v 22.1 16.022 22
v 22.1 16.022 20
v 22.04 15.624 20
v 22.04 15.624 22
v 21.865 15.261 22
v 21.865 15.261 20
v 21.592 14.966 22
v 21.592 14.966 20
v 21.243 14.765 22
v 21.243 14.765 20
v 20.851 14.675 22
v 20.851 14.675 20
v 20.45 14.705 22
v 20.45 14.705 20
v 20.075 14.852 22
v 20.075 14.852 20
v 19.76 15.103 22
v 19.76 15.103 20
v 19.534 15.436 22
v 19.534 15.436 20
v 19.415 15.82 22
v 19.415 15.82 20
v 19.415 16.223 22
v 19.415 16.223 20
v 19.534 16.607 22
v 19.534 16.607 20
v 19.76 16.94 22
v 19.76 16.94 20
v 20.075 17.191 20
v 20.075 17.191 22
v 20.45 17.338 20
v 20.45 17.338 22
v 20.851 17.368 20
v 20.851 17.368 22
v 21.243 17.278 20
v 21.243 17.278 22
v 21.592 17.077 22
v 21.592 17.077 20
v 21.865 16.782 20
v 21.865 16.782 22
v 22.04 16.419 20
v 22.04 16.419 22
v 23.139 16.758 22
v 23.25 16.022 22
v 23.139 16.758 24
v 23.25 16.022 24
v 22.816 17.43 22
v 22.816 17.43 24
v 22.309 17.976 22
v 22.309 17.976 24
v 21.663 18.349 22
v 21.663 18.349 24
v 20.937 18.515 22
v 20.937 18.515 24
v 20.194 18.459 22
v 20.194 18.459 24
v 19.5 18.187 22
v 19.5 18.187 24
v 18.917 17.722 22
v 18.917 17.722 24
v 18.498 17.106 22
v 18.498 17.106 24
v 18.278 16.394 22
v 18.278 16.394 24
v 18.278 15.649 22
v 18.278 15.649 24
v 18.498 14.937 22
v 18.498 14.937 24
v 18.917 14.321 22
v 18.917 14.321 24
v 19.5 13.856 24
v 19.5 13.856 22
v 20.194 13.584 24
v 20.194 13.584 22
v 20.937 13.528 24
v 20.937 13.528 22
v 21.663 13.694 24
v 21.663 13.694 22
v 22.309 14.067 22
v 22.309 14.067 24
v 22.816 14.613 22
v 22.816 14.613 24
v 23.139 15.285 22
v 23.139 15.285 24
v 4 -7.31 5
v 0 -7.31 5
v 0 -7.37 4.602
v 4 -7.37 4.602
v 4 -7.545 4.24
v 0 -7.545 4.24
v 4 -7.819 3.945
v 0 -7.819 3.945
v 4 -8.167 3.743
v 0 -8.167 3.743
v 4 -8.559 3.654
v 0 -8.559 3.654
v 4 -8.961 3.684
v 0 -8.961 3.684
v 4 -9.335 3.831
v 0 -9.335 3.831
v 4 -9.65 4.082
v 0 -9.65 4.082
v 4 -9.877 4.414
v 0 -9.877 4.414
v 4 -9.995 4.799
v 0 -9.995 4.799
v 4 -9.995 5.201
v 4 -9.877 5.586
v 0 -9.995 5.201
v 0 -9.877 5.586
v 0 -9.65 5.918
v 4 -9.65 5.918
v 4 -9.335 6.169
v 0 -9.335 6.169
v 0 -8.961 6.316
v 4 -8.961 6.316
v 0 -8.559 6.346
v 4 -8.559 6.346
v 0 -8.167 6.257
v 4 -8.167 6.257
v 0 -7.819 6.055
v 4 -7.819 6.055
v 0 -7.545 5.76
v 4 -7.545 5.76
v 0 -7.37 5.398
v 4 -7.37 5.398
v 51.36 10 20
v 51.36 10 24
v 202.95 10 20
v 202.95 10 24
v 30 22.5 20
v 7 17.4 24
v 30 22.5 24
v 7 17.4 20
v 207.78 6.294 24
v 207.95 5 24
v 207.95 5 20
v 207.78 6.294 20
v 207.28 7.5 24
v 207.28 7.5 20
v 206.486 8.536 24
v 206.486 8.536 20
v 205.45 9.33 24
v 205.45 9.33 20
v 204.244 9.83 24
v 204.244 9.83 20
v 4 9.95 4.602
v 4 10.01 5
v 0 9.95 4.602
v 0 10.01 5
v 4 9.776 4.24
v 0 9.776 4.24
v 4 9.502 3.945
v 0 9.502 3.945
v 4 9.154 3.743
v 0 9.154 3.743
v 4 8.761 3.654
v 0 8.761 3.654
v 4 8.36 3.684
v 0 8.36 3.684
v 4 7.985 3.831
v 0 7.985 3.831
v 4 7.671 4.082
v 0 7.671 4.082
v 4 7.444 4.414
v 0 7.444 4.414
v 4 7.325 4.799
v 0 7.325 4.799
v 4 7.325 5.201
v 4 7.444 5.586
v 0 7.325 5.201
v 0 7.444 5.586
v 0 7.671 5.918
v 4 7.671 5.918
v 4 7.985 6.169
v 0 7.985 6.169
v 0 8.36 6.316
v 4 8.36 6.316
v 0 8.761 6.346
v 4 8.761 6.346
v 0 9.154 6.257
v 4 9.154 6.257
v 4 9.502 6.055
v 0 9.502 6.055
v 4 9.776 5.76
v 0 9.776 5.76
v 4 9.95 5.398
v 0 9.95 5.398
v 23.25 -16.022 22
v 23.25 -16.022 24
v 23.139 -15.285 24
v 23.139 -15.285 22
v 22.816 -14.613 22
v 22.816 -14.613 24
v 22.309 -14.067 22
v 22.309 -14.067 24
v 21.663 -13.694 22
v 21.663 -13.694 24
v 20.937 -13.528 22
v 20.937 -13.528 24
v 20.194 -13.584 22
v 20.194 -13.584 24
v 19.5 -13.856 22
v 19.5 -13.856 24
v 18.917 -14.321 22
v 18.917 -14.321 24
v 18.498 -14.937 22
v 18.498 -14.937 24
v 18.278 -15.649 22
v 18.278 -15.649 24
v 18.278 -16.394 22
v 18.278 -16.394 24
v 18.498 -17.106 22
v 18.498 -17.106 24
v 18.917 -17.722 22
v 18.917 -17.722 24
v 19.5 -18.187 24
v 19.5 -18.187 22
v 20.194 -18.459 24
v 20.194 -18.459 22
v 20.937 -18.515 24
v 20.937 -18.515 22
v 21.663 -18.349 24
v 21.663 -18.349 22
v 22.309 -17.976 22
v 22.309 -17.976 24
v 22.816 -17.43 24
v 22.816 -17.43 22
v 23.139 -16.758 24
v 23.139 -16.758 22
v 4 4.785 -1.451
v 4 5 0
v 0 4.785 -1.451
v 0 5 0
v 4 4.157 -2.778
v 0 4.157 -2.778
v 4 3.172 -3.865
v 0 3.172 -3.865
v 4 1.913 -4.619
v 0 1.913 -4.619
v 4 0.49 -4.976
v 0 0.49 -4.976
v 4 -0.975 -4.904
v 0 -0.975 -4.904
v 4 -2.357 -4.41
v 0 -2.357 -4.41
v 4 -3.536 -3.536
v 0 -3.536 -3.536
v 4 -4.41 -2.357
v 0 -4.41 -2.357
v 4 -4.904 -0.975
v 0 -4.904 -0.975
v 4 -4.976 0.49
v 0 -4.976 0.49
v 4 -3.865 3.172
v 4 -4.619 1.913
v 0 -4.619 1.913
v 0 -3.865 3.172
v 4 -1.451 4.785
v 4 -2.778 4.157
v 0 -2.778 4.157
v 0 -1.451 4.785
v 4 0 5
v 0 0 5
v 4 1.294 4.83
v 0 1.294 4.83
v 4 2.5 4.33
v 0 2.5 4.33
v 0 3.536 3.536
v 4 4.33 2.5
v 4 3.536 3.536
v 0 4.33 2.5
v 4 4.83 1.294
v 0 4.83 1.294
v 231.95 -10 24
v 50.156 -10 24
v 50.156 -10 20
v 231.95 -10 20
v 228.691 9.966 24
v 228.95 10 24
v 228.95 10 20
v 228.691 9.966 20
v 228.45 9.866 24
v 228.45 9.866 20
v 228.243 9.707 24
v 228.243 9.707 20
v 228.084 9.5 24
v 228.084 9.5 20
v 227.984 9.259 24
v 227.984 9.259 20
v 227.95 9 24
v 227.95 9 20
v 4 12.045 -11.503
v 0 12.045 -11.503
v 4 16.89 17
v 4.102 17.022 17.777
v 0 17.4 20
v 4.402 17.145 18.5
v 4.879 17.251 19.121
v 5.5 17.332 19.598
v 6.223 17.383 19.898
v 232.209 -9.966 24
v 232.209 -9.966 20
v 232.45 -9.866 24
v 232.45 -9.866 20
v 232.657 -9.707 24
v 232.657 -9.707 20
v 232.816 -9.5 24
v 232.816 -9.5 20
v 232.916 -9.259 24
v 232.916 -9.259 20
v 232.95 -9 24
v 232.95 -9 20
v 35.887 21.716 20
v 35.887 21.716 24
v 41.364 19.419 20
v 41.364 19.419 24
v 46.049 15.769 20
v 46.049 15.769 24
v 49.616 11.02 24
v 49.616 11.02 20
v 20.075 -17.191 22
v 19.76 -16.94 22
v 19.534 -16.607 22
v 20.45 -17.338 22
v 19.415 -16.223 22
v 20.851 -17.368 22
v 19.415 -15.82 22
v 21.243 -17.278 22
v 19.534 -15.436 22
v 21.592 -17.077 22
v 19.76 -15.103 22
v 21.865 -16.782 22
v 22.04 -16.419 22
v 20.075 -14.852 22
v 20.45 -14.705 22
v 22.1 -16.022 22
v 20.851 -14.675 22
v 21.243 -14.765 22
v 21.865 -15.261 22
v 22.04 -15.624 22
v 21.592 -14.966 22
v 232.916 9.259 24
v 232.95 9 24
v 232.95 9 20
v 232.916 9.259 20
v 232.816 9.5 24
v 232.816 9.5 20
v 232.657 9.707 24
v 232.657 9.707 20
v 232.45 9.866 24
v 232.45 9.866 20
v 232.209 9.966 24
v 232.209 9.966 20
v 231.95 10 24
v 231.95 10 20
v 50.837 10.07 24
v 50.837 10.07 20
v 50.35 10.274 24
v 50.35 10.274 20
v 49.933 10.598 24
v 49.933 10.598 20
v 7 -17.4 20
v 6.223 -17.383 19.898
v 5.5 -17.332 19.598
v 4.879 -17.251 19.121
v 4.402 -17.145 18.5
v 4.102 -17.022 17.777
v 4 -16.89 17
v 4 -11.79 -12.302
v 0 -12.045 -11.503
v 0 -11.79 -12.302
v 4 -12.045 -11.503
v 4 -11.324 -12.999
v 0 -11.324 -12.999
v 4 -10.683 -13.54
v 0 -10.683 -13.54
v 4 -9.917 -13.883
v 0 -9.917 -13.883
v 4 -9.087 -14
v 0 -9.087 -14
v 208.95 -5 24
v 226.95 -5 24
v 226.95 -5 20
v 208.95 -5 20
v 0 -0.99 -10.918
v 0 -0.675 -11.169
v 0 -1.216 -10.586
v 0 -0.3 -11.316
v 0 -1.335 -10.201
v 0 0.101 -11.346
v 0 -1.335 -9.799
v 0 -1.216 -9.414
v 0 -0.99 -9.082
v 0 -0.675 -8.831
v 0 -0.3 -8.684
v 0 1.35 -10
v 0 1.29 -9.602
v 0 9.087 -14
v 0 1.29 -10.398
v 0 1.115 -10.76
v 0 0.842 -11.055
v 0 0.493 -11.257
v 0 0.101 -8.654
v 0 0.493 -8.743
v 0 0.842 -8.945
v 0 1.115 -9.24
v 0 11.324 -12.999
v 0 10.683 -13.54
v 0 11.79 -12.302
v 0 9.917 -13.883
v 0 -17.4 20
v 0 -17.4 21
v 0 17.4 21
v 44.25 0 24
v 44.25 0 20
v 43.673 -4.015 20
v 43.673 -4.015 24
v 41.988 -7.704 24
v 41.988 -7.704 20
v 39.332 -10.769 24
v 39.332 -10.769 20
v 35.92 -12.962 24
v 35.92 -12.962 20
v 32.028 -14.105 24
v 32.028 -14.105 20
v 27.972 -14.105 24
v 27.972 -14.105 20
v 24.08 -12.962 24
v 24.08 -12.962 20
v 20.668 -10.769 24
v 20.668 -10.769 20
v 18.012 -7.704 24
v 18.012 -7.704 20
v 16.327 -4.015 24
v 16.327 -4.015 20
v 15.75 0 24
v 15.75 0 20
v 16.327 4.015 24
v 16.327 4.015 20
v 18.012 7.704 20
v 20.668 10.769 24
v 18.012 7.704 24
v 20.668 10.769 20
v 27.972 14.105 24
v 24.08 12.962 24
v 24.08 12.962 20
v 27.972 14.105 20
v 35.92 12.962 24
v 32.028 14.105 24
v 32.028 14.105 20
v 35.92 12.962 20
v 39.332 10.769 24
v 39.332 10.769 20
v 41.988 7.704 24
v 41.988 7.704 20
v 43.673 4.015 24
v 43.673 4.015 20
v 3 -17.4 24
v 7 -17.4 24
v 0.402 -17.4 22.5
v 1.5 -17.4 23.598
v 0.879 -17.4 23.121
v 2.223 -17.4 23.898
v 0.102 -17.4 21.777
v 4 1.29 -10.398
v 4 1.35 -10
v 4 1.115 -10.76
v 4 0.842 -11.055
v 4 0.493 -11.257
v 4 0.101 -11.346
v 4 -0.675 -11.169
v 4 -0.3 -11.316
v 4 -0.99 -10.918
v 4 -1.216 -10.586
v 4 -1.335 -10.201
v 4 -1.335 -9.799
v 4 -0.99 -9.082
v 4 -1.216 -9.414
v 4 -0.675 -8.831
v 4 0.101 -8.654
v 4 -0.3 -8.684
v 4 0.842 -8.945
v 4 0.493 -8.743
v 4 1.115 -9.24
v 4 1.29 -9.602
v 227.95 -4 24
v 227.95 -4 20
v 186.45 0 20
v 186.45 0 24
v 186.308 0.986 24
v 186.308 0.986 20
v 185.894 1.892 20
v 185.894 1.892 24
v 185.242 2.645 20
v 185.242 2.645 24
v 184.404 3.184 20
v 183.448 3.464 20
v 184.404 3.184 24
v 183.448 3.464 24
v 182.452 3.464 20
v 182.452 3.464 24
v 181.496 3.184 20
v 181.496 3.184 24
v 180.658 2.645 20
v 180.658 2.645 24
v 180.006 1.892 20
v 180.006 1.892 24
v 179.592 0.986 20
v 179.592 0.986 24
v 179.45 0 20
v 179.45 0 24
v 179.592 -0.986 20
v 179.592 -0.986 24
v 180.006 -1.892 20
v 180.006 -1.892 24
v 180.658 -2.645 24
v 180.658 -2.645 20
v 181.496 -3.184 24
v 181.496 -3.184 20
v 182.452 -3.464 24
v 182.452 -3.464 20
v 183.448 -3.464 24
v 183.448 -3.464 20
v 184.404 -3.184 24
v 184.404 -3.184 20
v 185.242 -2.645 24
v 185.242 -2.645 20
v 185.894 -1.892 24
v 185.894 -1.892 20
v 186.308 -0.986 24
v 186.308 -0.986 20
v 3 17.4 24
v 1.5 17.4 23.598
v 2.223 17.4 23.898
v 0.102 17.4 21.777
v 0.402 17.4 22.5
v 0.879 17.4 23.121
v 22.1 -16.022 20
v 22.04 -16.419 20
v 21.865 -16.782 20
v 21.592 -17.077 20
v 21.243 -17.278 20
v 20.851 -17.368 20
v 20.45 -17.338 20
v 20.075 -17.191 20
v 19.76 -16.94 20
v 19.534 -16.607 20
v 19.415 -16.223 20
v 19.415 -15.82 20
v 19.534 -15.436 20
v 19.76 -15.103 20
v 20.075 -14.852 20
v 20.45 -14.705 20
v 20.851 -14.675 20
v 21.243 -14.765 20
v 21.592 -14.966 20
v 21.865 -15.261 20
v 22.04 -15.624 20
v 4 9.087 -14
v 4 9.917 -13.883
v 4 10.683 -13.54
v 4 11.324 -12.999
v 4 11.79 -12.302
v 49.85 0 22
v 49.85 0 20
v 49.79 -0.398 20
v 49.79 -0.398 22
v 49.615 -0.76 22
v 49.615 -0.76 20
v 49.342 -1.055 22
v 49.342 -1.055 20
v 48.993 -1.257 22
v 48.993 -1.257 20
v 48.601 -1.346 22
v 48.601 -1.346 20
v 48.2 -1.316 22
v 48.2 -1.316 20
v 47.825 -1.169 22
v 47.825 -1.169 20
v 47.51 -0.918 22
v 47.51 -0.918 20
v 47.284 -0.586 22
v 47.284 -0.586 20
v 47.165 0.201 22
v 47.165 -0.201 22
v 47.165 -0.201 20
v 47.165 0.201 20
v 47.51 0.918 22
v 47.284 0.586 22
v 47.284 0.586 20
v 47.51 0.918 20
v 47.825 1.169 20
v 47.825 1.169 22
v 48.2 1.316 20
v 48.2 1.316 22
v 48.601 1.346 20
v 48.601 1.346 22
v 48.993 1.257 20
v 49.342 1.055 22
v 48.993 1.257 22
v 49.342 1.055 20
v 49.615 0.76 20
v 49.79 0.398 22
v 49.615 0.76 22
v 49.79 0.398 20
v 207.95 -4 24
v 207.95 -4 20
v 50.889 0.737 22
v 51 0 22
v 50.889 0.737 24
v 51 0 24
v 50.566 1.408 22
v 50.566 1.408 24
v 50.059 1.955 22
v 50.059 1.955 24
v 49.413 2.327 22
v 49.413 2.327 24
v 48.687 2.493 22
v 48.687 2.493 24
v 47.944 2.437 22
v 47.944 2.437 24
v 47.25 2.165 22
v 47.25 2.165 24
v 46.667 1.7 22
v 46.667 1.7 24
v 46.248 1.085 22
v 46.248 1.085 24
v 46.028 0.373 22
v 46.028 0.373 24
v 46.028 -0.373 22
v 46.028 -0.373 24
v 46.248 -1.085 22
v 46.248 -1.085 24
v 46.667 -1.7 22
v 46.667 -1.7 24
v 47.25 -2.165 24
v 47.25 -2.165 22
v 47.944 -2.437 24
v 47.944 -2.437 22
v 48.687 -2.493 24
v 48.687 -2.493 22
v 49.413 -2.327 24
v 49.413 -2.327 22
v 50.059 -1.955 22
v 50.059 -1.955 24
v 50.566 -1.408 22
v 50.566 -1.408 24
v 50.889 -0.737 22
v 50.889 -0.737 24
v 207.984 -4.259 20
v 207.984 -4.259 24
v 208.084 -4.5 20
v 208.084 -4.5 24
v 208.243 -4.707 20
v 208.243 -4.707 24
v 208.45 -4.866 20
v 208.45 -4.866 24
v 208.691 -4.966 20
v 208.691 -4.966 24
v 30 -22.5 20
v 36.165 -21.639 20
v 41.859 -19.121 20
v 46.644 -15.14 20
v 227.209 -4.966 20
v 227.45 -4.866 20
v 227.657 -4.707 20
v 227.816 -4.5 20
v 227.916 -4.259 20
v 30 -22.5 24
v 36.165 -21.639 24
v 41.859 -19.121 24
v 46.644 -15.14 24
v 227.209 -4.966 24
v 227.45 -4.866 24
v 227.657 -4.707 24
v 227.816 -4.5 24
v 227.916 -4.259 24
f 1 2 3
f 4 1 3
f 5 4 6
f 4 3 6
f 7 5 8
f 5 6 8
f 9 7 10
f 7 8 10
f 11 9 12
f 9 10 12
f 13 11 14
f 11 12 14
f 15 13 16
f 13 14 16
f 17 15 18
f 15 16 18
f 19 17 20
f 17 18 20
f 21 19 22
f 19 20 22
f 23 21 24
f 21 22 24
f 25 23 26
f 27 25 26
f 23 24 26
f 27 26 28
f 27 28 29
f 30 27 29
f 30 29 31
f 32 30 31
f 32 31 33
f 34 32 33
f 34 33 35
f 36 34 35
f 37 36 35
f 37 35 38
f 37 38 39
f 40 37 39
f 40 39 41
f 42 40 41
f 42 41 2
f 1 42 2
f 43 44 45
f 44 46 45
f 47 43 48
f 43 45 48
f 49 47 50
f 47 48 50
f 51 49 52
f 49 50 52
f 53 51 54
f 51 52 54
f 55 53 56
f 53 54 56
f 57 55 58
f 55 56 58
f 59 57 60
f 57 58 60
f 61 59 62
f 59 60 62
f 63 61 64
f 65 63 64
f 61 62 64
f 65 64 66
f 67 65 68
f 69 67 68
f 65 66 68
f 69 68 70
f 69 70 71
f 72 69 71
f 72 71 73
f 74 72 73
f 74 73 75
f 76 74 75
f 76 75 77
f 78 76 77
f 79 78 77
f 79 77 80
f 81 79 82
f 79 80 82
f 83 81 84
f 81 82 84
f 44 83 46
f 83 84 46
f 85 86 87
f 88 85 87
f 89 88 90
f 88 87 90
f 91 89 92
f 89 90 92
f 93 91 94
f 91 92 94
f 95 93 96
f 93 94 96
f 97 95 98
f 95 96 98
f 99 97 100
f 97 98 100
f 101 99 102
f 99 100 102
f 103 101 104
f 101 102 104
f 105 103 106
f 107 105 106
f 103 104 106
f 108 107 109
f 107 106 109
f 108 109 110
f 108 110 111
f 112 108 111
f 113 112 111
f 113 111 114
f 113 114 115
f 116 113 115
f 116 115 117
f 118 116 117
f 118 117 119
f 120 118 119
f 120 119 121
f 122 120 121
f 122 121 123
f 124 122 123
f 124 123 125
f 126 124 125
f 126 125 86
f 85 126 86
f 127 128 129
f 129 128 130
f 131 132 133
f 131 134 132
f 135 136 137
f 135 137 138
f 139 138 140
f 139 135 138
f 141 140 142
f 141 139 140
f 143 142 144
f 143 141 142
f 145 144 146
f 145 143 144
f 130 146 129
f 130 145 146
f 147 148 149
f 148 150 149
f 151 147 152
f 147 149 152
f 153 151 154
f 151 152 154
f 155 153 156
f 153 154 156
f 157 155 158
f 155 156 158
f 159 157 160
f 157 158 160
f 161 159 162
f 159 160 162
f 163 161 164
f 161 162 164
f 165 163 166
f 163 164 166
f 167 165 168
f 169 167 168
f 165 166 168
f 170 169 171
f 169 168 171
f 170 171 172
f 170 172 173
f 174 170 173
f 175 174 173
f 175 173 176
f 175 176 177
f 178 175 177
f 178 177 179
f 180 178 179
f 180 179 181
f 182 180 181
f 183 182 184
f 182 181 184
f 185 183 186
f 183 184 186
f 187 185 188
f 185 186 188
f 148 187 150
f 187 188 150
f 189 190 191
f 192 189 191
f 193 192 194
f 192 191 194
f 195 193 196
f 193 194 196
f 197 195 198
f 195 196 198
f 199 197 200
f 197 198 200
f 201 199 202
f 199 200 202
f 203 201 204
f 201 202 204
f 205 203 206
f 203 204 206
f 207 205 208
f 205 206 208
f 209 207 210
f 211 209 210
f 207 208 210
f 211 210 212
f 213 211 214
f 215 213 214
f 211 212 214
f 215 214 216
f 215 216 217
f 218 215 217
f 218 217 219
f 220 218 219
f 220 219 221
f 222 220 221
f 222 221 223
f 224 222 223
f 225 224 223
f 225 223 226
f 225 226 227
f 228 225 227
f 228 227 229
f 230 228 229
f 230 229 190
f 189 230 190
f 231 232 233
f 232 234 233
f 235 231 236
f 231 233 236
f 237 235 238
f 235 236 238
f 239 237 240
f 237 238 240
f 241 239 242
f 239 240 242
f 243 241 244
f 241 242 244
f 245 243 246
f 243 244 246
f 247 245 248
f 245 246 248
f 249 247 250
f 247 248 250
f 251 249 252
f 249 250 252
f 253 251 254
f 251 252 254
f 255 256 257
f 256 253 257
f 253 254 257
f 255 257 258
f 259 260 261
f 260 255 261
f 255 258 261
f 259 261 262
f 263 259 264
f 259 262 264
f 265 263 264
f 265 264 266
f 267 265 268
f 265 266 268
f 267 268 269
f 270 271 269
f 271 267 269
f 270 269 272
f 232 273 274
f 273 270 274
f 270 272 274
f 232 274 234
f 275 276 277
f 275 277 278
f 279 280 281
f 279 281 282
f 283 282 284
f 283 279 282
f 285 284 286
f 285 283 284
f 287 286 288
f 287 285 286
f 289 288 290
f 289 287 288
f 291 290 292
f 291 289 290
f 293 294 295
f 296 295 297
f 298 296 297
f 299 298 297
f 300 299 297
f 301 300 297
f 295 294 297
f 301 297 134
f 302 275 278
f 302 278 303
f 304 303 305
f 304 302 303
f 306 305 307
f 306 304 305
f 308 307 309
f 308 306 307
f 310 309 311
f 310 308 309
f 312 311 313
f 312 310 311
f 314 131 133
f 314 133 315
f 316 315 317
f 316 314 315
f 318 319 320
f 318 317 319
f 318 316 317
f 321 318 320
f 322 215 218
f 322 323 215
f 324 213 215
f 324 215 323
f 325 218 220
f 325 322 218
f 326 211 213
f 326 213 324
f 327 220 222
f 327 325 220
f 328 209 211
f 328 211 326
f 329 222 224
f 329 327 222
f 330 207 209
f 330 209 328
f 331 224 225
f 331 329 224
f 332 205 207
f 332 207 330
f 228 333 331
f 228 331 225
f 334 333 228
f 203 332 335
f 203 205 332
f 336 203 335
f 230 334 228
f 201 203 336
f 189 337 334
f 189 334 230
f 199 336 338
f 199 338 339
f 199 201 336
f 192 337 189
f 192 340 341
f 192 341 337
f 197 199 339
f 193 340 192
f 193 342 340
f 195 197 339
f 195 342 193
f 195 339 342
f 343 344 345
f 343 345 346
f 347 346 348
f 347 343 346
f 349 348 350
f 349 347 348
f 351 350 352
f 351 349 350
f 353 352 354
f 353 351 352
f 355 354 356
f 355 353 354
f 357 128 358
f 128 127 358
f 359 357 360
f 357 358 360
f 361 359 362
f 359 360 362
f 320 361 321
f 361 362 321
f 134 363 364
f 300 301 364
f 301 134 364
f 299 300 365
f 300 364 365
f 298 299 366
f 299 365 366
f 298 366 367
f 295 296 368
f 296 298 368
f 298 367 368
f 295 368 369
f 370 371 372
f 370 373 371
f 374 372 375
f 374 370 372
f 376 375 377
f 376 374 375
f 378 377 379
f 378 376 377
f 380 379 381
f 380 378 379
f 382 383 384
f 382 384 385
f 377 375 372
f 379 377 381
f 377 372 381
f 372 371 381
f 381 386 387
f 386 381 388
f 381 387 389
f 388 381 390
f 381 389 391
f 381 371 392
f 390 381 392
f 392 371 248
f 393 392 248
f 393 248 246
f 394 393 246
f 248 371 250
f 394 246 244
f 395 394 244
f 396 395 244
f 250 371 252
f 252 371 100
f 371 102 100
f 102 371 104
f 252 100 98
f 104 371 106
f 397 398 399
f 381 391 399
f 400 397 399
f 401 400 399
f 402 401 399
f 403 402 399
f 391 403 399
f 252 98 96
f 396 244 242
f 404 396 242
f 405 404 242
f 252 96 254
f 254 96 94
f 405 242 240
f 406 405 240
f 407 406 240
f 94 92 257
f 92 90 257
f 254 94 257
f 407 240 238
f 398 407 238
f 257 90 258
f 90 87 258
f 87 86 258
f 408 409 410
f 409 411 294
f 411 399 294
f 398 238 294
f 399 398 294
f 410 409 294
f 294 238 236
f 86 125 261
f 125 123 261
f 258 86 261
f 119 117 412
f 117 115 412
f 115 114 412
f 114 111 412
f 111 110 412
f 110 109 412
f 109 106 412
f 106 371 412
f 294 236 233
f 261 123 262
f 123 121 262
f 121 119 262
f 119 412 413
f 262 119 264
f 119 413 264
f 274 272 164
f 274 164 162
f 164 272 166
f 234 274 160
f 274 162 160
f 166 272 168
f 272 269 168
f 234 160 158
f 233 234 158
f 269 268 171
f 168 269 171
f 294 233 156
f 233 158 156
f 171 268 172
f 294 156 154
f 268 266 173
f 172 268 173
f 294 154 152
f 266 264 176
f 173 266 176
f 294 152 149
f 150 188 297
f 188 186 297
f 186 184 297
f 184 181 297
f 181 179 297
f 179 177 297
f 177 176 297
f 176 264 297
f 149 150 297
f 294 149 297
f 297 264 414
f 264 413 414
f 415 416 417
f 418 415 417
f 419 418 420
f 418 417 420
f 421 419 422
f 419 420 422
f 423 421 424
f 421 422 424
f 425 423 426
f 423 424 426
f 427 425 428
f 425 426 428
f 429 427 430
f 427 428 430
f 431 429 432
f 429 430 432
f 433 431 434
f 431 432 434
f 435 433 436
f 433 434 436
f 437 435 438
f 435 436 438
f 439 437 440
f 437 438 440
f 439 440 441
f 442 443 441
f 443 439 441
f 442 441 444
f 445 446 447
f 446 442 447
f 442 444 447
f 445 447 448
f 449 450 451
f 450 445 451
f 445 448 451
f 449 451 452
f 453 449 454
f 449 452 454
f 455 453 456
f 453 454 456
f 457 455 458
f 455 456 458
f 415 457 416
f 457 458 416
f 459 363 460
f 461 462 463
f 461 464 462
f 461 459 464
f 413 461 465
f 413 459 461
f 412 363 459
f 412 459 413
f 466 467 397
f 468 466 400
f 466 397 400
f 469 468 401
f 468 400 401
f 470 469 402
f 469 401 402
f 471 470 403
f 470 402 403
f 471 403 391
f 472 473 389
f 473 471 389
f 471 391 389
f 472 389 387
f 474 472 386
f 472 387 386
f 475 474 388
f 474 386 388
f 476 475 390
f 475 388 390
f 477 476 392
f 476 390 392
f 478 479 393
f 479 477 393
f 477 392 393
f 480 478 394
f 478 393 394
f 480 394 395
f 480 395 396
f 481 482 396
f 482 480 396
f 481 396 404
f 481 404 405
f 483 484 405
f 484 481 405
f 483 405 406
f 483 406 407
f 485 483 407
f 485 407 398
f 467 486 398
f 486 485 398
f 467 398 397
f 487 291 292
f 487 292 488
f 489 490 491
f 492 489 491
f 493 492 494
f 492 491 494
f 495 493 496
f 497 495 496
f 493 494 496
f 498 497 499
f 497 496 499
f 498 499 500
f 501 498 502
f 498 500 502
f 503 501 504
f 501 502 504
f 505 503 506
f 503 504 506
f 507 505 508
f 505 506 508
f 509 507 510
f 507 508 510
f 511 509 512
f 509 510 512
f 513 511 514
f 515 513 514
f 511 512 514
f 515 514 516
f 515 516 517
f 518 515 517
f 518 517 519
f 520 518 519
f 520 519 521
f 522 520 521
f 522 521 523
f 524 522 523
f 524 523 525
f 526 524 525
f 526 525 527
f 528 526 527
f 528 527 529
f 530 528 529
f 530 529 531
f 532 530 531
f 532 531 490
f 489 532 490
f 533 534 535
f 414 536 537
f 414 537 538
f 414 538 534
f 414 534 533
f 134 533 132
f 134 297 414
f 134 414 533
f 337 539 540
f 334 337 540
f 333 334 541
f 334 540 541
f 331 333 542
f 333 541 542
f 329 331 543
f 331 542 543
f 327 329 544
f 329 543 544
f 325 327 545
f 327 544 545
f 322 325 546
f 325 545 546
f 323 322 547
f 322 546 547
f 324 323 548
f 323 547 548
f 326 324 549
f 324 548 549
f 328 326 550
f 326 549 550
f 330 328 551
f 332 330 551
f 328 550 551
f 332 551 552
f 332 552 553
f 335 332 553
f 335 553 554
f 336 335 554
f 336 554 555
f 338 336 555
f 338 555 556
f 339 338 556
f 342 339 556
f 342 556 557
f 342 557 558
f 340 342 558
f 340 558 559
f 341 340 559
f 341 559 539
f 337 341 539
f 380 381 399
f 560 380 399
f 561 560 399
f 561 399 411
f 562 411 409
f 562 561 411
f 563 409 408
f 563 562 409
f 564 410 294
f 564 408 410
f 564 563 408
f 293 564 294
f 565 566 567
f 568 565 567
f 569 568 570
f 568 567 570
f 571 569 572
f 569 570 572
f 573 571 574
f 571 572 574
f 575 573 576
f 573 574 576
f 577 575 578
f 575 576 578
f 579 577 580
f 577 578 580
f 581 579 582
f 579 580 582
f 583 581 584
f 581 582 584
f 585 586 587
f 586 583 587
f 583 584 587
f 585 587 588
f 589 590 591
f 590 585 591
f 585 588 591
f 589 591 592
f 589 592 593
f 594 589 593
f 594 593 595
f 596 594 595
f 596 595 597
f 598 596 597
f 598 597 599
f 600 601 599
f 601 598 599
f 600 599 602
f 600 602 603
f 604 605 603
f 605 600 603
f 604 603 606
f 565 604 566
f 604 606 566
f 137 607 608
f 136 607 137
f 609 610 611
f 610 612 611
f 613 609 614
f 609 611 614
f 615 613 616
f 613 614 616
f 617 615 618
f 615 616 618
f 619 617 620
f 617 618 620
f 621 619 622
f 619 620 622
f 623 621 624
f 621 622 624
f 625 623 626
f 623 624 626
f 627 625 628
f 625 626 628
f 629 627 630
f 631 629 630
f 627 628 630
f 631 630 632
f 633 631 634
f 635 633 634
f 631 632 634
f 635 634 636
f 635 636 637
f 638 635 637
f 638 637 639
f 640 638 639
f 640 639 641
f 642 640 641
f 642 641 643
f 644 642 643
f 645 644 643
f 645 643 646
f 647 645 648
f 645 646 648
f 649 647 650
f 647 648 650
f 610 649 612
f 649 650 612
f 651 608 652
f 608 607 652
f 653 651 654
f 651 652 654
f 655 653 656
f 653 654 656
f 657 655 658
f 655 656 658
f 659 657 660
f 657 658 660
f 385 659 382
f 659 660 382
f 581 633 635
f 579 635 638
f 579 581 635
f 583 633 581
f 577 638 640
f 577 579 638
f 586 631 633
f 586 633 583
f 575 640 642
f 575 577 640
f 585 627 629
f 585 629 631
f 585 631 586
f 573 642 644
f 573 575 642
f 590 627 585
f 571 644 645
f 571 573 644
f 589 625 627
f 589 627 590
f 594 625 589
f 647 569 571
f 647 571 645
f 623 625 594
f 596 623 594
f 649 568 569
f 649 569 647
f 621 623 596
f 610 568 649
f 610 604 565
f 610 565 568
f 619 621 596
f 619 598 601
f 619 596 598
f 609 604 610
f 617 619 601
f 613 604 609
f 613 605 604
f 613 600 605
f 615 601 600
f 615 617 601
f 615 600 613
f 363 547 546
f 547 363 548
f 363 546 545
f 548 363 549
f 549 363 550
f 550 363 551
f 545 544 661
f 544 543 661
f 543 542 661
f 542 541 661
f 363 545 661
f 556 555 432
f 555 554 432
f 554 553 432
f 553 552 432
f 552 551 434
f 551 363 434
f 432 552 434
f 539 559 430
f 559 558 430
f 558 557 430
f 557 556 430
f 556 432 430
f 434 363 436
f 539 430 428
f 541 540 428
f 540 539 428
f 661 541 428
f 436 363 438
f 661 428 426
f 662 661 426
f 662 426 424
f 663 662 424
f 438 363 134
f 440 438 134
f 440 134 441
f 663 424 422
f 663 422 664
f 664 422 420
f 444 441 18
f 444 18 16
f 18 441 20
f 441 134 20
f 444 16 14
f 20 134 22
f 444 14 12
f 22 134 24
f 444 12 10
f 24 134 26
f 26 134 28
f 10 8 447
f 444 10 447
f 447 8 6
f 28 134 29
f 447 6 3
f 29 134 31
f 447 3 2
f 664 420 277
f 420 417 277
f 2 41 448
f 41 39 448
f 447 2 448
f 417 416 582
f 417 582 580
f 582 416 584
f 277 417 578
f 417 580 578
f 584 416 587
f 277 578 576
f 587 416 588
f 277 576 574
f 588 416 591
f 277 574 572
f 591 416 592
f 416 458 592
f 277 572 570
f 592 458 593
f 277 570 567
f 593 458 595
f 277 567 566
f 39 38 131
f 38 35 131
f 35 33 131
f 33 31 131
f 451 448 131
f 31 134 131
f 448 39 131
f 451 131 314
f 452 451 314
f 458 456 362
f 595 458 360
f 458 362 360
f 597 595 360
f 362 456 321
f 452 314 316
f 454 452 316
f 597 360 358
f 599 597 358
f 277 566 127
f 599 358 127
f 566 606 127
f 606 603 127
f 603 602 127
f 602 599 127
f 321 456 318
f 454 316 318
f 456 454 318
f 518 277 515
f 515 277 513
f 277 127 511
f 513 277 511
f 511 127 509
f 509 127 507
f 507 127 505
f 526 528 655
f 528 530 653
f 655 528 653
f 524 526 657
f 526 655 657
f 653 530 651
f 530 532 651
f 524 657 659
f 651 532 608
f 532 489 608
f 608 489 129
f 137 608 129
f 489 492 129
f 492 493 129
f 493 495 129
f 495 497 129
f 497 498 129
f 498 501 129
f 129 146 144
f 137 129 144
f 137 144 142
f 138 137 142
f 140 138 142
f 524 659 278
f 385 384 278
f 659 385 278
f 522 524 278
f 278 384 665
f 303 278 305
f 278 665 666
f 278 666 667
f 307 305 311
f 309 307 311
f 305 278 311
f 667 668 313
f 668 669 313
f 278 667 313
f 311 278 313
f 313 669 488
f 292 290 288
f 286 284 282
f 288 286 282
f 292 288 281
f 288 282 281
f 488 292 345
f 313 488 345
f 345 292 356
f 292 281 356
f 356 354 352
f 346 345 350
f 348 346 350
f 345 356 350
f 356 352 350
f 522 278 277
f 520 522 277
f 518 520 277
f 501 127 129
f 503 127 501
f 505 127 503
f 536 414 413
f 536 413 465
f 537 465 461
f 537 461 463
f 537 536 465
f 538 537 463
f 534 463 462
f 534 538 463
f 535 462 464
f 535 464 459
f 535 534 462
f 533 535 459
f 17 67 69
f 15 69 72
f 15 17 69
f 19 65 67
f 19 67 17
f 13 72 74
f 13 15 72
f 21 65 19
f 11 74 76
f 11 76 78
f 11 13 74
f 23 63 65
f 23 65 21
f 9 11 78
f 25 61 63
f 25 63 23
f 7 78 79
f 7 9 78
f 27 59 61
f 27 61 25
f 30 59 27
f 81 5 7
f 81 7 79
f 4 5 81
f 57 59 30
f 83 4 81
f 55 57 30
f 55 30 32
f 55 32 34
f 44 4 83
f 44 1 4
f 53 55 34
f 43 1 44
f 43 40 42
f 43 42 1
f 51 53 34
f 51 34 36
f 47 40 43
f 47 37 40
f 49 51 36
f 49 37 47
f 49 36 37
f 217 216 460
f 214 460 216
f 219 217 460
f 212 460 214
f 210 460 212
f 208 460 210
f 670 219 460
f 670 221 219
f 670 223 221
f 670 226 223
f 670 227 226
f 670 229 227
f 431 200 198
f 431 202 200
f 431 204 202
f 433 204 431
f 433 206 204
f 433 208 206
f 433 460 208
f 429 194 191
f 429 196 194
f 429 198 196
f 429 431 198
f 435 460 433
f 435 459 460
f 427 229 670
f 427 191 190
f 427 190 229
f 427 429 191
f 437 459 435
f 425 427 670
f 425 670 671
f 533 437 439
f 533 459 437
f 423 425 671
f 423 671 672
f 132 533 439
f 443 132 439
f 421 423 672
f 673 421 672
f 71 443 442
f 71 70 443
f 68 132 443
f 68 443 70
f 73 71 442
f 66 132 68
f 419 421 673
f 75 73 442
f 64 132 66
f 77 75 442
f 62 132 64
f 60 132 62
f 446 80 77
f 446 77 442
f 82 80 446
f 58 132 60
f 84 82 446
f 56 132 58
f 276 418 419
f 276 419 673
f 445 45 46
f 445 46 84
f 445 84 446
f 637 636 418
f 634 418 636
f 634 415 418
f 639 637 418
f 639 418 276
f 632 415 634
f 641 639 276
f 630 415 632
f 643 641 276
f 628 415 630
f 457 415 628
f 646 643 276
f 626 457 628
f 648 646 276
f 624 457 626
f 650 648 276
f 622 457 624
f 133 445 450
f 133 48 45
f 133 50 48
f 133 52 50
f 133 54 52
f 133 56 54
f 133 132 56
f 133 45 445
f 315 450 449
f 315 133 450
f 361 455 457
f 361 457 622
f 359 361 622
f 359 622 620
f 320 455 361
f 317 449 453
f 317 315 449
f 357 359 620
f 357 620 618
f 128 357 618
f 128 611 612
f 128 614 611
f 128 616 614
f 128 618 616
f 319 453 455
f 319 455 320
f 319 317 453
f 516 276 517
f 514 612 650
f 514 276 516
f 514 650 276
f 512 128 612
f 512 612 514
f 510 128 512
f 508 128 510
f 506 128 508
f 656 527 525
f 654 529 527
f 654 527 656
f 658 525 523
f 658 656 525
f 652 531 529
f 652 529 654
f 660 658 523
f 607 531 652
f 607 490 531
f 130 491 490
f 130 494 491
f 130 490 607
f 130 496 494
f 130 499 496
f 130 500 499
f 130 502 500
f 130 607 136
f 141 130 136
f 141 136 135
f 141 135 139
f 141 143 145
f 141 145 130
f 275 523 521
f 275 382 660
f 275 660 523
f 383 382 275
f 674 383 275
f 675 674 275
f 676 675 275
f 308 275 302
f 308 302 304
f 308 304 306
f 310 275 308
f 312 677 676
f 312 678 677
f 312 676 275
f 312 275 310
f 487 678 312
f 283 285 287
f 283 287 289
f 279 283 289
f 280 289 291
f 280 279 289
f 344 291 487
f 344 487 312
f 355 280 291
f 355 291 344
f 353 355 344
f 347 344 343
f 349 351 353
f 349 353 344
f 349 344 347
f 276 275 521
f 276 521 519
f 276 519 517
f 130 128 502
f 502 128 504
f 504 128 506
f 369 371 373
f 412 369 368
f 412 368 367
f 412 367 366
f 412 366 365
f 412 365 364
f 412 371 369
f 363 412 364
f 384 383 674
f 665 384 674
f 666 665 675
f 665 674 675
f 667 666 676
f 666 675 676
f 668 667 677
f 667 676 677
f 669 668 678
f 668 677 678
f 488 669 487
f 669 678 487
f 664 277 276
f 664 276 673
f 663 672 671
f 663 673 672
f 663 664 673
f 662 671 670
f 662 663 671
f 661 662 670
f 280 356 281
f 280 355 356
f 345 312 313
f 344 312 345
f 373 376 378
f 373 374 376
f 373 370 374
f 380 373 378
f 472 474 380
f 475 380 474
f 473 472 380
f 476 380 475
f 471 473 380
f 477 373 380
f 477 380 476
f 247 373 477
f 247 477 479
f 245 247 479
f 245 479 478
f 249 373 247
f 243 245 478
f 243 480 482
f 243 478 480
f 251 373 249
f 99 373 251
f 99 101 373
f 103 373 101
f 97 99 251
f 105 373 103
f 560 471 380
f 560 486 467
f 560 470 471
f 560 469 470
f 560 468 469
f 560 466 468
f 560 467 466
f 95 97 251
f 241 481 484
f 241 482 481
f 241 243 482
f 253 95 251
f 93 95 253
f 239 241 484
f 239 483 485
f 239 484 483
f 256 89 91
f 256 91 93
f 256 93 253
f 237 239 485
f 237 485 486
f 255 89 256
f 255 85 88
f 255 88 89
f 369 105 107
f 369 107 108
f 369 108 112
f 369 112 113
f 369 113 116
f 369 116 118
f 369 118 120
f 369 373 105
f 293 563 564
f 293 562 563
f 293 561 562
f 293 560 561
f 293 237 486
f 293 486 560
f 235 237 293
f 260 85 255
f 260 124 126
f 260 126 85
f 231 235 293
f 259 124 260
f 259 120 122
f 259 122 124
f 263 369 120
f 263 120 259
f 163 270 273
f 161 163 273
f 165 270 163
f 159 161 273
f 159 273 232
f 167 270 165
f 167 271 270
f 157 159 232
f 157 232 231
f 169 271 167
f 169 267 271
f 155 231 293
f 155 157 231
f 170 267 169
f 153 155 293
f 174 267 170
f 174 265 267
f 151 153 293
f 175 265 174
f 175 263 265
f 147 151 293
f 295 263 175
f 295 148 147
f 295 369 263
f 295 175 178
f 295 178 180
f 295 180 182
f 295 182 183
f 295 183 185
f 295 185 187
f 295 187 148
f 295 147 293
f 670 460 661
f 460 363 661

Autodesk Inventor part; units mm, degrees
ref_plane "YZ Plane" through (0, 0, 0) normal (1, 0, 0) x (0, 1, 0)
ref_plane "XZ Plane" through (0, 0, 0) normal (0, 1, 0) x (-1, 0, 0)
ref_plane "XY Plane" through (0, 0, 0) normal (0, 0, 1) x (1, 0, 0)
sketch "スケッチ1" plane through (0, 0, 0) normal (1, 0, 0) x (0, 1, 0)
  circle A0 centre (0, 0) radius 10
  circle A1 centre (0, -10) radius 1.35
  circle A2 centre (8.6603, 5) radius 1.35
  circle A3 centre (-8.6603, 5) radius 1.35
  circle A4 centre (0, 0) radius 5
  line L0 (0, 0) -> (0, 50)
  circle A5 centre (0, 50) radius 22.5
  circle A6 centre (0, 0) radius 14
  line L1 (-14, 0) -> (-22.5, 50)
  line L2 (14, 0) -> (22.5, 50)
  line L3 (0, -14) -> (-11.62, -14)
  line L4 (-11.62, -14) -> (-14, 0)
  line L5 (0, -14) -> (11.62, -14)
  line L6 (11.62, -14) -> (14, 0)
  line L7 (0, 20) -> (-17.4, 20)
  line L8 (0, 20) -> (17.4, 20)
  dimension "d0" = 20
  dimension "d1" = 2.7
  dimension "d4" = 360
  dimension "d6" = 10
  dimension "d7" = 50
  dimension "d8" = 45
  dimension "d9" = 28
extrude "押し出し1" add sketch "スケッチ1" along normal blind 4 contours A0 A1 A3 A2 | A6 L6 L4 | A6 L1 L7 L0 | L0 L8 L2 A6 | L6 L5 A6 | A6 L3 L4
sketch "スケッチ2" plane through (0, -17.4, 20) normal (0, 0, 1) x (1, 0, 0)
  line L0 (0, 17.4) -> (30, 17.4)
  circle A0 centre (30, 17.4) radius 22.5
  circle A1 centre (30, 17.4) radius 18.5
  circle A2 centre (30, 17.4) radius 14.25
  circle A3 centre (48.5, 17.4) radius 1.35
  circle A4 centre (20.75, 33.4215) radius 1.35
  circle A5 centre (20.75, 1.3785) radius 1.35
  line L1 (0, 29.02) -> (0, 34.8) projected
  line L2 (0, 0) -> (0, 5.78) projected
  line L3 (0, 34.8) -> (0, 0)
  line L4 (4, 29.02) -> (4, 34.8) projected
  line L5 (4, 34.8) -> (7, 34.8)
  line L6 (7, 34.8) -> (30, 39.9)
  line L7 (4, 0) -> (4, 5.78) projected
  line L8 (4, 0) -> (7, 0)
  line L9 (7, 0) -> (30, -5.1)
  line L10 (4, 0) -> (0, 0)
  line L11 (0, 34.8) -> (4, 34.8) projected
  line L12 (0, 0) -> (0, 34.8)
  line L13 (0, 34.8) -> (4, 34.8)
  dimension "d14" = 37
  dimension "d12" = 30
  dimension "d13" = 45
  dimension "d15" = 28.5
  dimension "d16" = 2.7
  dimension "d19" = 360
  dimension "d21" = 3
  dimension "d22" = 3
extrude "押し出し2" add sketch "スケッチ2" along normal blind 4 contours L3 L1 L11 L5 L6 A0 L0 | L0 A0 L9 L8 L10 L2 L3 | A1 A4 A3 A5 | A0 L6 L9
fillet "フィレット1" radius 3 2 edges at (4, 0, 20) (0, 0, 24)
fillet "フィレット2" radius 3 2 edges at (2, -11.62, -14) (2, 11.62, -14)
sketch "スケッチ7" plane through (0, -17.4, 24) normal (0, 0, 1) x (1, 0, 0)
  circle A0 centre (30, 17.4) radius 14.25 projected
  line L0 (30, 17.4) -> (182.95, 17.4)
  line L1 (30, 17.4) -> (182.95, 17.4) construction
  circle A1 centre (182.95, 17.4) radius 3.5
  circle A2 centre (182.95, 17.4) radius 10
  line L2 (182.95, 27.4) -> (50.1556, 27.4)
  arc A3 (30, -5.1) -> (30, 39.9) centre (30, 17.4) ccw projected
  line L3 (182.95, 27.4) -> (315.7444, 27.4) construction
  line L4 (182.95, 7.4) -> (50.1556, 7.4)
  point P0 (0, 17.4)
  dimension "d55" = 152.95
  dimension "d56" = 0
  dimension "d57" = 7
  dimension "d58" = 20
  dimension "d59" = 180
extrude "押し出し7" add sketch "スケッチ7" against normal blind 4 contours A3 L2 A2 L0 | L0 A2 L4 A3 | A2
sketch "スケッチ8" plane through (0, -17.4, 24) normal (0, 0, 1) x (1, 0, 0)
  circle A0 centre (20.75, 33.4215) radius 1.35 projected
  circle A1 centre (20.75, 33.4215) radius 2.5
  circle A2 centre (48.5, 17.4) radius 1.35 projected
  circle A3 centre (48.5, 17.4) radius 2.5
  circle A4 centre (20.75, 1.3785) radius 1.35 projected
  circle A5 centre (20.75, 1.3785) radius 2.5
  point P0 (0, 17.4)
  dimension "d63" = 5
  dimension "d64" = 5
  dimension "d65" = 5
extrude "押し出し8" cut sketch "スケッチ8" against normal blind 2 contours A0 | A1 | A3 | A4 | A5
fillet "フィレット4" radius 2 1 edges at (50.1556, 10, 22)
sketch "スケッチ11" plane through (0, -17.4, 24) normal (0, 0, 1) x (1, 0, 0)
  line L0 (51.36, 27.4) -> (182.95, 27.4) projected
  line L1 (182.95, 27.4) -> (202.95, 27.4)
  arc A0 (182.95, 7.4) -> (182.95, 27.4) centre (182.95, 17.4) ccw projected
  line L2 (182.95, 7.4) -> (207.95, 7.4)
  line L3 (207.95, 13.4) -> (207.95, 22.4)
  line L4 (207.95, 7.4) -> (231.95, 7.4)
  line L5 (232.95, 8.4) -> (232.95, 26.4)
  line L6 (231.95, 27.4) -> (228.95, 27.4)
  line L7 (227.95, 26.4) -> (227.95, 13.4)
  line L8 (226.95, 12.4) -> (208.95, 12.4)
  arc A1 (232.95, 26.4) -> (231.95, 27.4) centre (231.95, 26.4) ccw
  arc A2 (228.95, 27.4) -> (227.95, 26.4) centre (228.95, 26.4) ccw
  arc A3 (231.95, 7.4) -> (232.95, 8.4) centre (231.95, 8.4) ccw
  arc A4 (226.95, 12.4) -> (227.95, 13.4) centre (226.95, 13.4) ccw
  arc A5 (207.95, 13.4) -> (208.95, 12.4) centre (208.95, 13.4) ccw
  arc A6 (207.95, 22.4) -> (202.95, 27.4) centre (202.95, 22.4) ccw
  point P0 (0, 17.4)
  point P1 (207.95, 27.4)
  point P2 (232.95, 7.4)
  point P3 (232.95, 27.4)
  point P4 (227.95, 27.4)
  point P5 (227.95, 12.4)
  dimension "d83" = 25
  dimension "d84" = 25
  dimension "d85" = 20
  dimension "d86" = 5
  dimension "d87" = 15
  dimension "d88" = 1
  dimension "d89" = 5
extrude "押し出し11" add sketch "スケッチ11" against normal blind 4
properties part number "motor_holder_8-3" material "ABS プラスチック"
